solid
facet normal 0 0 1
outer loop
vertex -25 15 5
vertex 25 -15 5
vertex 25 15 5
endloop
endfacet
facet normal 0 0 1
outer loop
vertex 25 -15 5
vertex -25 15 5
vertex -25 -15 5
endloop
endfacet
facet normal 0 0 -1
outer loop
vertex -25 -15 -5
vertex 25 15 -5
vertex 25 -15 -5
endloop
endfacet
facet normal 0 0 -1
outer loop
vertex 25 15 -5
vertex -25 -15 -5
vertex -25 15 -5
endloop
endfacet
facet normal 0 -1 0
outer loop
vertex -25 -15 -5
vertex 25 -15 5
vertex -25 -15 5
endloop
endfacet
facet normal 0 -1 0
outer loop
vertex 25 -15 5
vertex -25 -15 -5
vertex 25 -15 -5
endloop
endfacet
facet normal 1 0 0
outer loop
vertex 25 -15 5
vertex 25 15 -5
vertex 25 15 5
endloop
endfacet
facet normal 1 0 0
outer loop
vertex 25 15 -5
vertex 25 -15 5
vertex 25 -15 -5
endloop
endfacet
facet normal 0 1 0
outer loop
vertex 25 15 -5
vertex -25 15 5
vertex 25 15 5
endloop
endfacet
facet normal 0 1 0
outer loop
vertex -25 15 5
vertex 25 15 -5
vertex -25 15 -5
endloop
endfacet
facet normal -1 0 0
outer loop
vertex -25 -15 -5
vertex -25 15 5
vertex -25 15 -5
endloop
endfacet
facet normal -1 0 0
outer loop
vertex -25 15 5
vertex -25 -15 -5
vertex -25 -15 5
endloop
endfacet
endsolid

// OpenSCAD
// Define dimensions for the rectangular block
block_length = 50;  // Length of the block
block_width = 30;   // Width of the block
block_height = 10;  // Height of the block

// Create the rectangular block
module rectangular_block() {
    cube([block_length, block_width, block_height], center = true);
}

// Call the module to render the block
rectangular_block();
